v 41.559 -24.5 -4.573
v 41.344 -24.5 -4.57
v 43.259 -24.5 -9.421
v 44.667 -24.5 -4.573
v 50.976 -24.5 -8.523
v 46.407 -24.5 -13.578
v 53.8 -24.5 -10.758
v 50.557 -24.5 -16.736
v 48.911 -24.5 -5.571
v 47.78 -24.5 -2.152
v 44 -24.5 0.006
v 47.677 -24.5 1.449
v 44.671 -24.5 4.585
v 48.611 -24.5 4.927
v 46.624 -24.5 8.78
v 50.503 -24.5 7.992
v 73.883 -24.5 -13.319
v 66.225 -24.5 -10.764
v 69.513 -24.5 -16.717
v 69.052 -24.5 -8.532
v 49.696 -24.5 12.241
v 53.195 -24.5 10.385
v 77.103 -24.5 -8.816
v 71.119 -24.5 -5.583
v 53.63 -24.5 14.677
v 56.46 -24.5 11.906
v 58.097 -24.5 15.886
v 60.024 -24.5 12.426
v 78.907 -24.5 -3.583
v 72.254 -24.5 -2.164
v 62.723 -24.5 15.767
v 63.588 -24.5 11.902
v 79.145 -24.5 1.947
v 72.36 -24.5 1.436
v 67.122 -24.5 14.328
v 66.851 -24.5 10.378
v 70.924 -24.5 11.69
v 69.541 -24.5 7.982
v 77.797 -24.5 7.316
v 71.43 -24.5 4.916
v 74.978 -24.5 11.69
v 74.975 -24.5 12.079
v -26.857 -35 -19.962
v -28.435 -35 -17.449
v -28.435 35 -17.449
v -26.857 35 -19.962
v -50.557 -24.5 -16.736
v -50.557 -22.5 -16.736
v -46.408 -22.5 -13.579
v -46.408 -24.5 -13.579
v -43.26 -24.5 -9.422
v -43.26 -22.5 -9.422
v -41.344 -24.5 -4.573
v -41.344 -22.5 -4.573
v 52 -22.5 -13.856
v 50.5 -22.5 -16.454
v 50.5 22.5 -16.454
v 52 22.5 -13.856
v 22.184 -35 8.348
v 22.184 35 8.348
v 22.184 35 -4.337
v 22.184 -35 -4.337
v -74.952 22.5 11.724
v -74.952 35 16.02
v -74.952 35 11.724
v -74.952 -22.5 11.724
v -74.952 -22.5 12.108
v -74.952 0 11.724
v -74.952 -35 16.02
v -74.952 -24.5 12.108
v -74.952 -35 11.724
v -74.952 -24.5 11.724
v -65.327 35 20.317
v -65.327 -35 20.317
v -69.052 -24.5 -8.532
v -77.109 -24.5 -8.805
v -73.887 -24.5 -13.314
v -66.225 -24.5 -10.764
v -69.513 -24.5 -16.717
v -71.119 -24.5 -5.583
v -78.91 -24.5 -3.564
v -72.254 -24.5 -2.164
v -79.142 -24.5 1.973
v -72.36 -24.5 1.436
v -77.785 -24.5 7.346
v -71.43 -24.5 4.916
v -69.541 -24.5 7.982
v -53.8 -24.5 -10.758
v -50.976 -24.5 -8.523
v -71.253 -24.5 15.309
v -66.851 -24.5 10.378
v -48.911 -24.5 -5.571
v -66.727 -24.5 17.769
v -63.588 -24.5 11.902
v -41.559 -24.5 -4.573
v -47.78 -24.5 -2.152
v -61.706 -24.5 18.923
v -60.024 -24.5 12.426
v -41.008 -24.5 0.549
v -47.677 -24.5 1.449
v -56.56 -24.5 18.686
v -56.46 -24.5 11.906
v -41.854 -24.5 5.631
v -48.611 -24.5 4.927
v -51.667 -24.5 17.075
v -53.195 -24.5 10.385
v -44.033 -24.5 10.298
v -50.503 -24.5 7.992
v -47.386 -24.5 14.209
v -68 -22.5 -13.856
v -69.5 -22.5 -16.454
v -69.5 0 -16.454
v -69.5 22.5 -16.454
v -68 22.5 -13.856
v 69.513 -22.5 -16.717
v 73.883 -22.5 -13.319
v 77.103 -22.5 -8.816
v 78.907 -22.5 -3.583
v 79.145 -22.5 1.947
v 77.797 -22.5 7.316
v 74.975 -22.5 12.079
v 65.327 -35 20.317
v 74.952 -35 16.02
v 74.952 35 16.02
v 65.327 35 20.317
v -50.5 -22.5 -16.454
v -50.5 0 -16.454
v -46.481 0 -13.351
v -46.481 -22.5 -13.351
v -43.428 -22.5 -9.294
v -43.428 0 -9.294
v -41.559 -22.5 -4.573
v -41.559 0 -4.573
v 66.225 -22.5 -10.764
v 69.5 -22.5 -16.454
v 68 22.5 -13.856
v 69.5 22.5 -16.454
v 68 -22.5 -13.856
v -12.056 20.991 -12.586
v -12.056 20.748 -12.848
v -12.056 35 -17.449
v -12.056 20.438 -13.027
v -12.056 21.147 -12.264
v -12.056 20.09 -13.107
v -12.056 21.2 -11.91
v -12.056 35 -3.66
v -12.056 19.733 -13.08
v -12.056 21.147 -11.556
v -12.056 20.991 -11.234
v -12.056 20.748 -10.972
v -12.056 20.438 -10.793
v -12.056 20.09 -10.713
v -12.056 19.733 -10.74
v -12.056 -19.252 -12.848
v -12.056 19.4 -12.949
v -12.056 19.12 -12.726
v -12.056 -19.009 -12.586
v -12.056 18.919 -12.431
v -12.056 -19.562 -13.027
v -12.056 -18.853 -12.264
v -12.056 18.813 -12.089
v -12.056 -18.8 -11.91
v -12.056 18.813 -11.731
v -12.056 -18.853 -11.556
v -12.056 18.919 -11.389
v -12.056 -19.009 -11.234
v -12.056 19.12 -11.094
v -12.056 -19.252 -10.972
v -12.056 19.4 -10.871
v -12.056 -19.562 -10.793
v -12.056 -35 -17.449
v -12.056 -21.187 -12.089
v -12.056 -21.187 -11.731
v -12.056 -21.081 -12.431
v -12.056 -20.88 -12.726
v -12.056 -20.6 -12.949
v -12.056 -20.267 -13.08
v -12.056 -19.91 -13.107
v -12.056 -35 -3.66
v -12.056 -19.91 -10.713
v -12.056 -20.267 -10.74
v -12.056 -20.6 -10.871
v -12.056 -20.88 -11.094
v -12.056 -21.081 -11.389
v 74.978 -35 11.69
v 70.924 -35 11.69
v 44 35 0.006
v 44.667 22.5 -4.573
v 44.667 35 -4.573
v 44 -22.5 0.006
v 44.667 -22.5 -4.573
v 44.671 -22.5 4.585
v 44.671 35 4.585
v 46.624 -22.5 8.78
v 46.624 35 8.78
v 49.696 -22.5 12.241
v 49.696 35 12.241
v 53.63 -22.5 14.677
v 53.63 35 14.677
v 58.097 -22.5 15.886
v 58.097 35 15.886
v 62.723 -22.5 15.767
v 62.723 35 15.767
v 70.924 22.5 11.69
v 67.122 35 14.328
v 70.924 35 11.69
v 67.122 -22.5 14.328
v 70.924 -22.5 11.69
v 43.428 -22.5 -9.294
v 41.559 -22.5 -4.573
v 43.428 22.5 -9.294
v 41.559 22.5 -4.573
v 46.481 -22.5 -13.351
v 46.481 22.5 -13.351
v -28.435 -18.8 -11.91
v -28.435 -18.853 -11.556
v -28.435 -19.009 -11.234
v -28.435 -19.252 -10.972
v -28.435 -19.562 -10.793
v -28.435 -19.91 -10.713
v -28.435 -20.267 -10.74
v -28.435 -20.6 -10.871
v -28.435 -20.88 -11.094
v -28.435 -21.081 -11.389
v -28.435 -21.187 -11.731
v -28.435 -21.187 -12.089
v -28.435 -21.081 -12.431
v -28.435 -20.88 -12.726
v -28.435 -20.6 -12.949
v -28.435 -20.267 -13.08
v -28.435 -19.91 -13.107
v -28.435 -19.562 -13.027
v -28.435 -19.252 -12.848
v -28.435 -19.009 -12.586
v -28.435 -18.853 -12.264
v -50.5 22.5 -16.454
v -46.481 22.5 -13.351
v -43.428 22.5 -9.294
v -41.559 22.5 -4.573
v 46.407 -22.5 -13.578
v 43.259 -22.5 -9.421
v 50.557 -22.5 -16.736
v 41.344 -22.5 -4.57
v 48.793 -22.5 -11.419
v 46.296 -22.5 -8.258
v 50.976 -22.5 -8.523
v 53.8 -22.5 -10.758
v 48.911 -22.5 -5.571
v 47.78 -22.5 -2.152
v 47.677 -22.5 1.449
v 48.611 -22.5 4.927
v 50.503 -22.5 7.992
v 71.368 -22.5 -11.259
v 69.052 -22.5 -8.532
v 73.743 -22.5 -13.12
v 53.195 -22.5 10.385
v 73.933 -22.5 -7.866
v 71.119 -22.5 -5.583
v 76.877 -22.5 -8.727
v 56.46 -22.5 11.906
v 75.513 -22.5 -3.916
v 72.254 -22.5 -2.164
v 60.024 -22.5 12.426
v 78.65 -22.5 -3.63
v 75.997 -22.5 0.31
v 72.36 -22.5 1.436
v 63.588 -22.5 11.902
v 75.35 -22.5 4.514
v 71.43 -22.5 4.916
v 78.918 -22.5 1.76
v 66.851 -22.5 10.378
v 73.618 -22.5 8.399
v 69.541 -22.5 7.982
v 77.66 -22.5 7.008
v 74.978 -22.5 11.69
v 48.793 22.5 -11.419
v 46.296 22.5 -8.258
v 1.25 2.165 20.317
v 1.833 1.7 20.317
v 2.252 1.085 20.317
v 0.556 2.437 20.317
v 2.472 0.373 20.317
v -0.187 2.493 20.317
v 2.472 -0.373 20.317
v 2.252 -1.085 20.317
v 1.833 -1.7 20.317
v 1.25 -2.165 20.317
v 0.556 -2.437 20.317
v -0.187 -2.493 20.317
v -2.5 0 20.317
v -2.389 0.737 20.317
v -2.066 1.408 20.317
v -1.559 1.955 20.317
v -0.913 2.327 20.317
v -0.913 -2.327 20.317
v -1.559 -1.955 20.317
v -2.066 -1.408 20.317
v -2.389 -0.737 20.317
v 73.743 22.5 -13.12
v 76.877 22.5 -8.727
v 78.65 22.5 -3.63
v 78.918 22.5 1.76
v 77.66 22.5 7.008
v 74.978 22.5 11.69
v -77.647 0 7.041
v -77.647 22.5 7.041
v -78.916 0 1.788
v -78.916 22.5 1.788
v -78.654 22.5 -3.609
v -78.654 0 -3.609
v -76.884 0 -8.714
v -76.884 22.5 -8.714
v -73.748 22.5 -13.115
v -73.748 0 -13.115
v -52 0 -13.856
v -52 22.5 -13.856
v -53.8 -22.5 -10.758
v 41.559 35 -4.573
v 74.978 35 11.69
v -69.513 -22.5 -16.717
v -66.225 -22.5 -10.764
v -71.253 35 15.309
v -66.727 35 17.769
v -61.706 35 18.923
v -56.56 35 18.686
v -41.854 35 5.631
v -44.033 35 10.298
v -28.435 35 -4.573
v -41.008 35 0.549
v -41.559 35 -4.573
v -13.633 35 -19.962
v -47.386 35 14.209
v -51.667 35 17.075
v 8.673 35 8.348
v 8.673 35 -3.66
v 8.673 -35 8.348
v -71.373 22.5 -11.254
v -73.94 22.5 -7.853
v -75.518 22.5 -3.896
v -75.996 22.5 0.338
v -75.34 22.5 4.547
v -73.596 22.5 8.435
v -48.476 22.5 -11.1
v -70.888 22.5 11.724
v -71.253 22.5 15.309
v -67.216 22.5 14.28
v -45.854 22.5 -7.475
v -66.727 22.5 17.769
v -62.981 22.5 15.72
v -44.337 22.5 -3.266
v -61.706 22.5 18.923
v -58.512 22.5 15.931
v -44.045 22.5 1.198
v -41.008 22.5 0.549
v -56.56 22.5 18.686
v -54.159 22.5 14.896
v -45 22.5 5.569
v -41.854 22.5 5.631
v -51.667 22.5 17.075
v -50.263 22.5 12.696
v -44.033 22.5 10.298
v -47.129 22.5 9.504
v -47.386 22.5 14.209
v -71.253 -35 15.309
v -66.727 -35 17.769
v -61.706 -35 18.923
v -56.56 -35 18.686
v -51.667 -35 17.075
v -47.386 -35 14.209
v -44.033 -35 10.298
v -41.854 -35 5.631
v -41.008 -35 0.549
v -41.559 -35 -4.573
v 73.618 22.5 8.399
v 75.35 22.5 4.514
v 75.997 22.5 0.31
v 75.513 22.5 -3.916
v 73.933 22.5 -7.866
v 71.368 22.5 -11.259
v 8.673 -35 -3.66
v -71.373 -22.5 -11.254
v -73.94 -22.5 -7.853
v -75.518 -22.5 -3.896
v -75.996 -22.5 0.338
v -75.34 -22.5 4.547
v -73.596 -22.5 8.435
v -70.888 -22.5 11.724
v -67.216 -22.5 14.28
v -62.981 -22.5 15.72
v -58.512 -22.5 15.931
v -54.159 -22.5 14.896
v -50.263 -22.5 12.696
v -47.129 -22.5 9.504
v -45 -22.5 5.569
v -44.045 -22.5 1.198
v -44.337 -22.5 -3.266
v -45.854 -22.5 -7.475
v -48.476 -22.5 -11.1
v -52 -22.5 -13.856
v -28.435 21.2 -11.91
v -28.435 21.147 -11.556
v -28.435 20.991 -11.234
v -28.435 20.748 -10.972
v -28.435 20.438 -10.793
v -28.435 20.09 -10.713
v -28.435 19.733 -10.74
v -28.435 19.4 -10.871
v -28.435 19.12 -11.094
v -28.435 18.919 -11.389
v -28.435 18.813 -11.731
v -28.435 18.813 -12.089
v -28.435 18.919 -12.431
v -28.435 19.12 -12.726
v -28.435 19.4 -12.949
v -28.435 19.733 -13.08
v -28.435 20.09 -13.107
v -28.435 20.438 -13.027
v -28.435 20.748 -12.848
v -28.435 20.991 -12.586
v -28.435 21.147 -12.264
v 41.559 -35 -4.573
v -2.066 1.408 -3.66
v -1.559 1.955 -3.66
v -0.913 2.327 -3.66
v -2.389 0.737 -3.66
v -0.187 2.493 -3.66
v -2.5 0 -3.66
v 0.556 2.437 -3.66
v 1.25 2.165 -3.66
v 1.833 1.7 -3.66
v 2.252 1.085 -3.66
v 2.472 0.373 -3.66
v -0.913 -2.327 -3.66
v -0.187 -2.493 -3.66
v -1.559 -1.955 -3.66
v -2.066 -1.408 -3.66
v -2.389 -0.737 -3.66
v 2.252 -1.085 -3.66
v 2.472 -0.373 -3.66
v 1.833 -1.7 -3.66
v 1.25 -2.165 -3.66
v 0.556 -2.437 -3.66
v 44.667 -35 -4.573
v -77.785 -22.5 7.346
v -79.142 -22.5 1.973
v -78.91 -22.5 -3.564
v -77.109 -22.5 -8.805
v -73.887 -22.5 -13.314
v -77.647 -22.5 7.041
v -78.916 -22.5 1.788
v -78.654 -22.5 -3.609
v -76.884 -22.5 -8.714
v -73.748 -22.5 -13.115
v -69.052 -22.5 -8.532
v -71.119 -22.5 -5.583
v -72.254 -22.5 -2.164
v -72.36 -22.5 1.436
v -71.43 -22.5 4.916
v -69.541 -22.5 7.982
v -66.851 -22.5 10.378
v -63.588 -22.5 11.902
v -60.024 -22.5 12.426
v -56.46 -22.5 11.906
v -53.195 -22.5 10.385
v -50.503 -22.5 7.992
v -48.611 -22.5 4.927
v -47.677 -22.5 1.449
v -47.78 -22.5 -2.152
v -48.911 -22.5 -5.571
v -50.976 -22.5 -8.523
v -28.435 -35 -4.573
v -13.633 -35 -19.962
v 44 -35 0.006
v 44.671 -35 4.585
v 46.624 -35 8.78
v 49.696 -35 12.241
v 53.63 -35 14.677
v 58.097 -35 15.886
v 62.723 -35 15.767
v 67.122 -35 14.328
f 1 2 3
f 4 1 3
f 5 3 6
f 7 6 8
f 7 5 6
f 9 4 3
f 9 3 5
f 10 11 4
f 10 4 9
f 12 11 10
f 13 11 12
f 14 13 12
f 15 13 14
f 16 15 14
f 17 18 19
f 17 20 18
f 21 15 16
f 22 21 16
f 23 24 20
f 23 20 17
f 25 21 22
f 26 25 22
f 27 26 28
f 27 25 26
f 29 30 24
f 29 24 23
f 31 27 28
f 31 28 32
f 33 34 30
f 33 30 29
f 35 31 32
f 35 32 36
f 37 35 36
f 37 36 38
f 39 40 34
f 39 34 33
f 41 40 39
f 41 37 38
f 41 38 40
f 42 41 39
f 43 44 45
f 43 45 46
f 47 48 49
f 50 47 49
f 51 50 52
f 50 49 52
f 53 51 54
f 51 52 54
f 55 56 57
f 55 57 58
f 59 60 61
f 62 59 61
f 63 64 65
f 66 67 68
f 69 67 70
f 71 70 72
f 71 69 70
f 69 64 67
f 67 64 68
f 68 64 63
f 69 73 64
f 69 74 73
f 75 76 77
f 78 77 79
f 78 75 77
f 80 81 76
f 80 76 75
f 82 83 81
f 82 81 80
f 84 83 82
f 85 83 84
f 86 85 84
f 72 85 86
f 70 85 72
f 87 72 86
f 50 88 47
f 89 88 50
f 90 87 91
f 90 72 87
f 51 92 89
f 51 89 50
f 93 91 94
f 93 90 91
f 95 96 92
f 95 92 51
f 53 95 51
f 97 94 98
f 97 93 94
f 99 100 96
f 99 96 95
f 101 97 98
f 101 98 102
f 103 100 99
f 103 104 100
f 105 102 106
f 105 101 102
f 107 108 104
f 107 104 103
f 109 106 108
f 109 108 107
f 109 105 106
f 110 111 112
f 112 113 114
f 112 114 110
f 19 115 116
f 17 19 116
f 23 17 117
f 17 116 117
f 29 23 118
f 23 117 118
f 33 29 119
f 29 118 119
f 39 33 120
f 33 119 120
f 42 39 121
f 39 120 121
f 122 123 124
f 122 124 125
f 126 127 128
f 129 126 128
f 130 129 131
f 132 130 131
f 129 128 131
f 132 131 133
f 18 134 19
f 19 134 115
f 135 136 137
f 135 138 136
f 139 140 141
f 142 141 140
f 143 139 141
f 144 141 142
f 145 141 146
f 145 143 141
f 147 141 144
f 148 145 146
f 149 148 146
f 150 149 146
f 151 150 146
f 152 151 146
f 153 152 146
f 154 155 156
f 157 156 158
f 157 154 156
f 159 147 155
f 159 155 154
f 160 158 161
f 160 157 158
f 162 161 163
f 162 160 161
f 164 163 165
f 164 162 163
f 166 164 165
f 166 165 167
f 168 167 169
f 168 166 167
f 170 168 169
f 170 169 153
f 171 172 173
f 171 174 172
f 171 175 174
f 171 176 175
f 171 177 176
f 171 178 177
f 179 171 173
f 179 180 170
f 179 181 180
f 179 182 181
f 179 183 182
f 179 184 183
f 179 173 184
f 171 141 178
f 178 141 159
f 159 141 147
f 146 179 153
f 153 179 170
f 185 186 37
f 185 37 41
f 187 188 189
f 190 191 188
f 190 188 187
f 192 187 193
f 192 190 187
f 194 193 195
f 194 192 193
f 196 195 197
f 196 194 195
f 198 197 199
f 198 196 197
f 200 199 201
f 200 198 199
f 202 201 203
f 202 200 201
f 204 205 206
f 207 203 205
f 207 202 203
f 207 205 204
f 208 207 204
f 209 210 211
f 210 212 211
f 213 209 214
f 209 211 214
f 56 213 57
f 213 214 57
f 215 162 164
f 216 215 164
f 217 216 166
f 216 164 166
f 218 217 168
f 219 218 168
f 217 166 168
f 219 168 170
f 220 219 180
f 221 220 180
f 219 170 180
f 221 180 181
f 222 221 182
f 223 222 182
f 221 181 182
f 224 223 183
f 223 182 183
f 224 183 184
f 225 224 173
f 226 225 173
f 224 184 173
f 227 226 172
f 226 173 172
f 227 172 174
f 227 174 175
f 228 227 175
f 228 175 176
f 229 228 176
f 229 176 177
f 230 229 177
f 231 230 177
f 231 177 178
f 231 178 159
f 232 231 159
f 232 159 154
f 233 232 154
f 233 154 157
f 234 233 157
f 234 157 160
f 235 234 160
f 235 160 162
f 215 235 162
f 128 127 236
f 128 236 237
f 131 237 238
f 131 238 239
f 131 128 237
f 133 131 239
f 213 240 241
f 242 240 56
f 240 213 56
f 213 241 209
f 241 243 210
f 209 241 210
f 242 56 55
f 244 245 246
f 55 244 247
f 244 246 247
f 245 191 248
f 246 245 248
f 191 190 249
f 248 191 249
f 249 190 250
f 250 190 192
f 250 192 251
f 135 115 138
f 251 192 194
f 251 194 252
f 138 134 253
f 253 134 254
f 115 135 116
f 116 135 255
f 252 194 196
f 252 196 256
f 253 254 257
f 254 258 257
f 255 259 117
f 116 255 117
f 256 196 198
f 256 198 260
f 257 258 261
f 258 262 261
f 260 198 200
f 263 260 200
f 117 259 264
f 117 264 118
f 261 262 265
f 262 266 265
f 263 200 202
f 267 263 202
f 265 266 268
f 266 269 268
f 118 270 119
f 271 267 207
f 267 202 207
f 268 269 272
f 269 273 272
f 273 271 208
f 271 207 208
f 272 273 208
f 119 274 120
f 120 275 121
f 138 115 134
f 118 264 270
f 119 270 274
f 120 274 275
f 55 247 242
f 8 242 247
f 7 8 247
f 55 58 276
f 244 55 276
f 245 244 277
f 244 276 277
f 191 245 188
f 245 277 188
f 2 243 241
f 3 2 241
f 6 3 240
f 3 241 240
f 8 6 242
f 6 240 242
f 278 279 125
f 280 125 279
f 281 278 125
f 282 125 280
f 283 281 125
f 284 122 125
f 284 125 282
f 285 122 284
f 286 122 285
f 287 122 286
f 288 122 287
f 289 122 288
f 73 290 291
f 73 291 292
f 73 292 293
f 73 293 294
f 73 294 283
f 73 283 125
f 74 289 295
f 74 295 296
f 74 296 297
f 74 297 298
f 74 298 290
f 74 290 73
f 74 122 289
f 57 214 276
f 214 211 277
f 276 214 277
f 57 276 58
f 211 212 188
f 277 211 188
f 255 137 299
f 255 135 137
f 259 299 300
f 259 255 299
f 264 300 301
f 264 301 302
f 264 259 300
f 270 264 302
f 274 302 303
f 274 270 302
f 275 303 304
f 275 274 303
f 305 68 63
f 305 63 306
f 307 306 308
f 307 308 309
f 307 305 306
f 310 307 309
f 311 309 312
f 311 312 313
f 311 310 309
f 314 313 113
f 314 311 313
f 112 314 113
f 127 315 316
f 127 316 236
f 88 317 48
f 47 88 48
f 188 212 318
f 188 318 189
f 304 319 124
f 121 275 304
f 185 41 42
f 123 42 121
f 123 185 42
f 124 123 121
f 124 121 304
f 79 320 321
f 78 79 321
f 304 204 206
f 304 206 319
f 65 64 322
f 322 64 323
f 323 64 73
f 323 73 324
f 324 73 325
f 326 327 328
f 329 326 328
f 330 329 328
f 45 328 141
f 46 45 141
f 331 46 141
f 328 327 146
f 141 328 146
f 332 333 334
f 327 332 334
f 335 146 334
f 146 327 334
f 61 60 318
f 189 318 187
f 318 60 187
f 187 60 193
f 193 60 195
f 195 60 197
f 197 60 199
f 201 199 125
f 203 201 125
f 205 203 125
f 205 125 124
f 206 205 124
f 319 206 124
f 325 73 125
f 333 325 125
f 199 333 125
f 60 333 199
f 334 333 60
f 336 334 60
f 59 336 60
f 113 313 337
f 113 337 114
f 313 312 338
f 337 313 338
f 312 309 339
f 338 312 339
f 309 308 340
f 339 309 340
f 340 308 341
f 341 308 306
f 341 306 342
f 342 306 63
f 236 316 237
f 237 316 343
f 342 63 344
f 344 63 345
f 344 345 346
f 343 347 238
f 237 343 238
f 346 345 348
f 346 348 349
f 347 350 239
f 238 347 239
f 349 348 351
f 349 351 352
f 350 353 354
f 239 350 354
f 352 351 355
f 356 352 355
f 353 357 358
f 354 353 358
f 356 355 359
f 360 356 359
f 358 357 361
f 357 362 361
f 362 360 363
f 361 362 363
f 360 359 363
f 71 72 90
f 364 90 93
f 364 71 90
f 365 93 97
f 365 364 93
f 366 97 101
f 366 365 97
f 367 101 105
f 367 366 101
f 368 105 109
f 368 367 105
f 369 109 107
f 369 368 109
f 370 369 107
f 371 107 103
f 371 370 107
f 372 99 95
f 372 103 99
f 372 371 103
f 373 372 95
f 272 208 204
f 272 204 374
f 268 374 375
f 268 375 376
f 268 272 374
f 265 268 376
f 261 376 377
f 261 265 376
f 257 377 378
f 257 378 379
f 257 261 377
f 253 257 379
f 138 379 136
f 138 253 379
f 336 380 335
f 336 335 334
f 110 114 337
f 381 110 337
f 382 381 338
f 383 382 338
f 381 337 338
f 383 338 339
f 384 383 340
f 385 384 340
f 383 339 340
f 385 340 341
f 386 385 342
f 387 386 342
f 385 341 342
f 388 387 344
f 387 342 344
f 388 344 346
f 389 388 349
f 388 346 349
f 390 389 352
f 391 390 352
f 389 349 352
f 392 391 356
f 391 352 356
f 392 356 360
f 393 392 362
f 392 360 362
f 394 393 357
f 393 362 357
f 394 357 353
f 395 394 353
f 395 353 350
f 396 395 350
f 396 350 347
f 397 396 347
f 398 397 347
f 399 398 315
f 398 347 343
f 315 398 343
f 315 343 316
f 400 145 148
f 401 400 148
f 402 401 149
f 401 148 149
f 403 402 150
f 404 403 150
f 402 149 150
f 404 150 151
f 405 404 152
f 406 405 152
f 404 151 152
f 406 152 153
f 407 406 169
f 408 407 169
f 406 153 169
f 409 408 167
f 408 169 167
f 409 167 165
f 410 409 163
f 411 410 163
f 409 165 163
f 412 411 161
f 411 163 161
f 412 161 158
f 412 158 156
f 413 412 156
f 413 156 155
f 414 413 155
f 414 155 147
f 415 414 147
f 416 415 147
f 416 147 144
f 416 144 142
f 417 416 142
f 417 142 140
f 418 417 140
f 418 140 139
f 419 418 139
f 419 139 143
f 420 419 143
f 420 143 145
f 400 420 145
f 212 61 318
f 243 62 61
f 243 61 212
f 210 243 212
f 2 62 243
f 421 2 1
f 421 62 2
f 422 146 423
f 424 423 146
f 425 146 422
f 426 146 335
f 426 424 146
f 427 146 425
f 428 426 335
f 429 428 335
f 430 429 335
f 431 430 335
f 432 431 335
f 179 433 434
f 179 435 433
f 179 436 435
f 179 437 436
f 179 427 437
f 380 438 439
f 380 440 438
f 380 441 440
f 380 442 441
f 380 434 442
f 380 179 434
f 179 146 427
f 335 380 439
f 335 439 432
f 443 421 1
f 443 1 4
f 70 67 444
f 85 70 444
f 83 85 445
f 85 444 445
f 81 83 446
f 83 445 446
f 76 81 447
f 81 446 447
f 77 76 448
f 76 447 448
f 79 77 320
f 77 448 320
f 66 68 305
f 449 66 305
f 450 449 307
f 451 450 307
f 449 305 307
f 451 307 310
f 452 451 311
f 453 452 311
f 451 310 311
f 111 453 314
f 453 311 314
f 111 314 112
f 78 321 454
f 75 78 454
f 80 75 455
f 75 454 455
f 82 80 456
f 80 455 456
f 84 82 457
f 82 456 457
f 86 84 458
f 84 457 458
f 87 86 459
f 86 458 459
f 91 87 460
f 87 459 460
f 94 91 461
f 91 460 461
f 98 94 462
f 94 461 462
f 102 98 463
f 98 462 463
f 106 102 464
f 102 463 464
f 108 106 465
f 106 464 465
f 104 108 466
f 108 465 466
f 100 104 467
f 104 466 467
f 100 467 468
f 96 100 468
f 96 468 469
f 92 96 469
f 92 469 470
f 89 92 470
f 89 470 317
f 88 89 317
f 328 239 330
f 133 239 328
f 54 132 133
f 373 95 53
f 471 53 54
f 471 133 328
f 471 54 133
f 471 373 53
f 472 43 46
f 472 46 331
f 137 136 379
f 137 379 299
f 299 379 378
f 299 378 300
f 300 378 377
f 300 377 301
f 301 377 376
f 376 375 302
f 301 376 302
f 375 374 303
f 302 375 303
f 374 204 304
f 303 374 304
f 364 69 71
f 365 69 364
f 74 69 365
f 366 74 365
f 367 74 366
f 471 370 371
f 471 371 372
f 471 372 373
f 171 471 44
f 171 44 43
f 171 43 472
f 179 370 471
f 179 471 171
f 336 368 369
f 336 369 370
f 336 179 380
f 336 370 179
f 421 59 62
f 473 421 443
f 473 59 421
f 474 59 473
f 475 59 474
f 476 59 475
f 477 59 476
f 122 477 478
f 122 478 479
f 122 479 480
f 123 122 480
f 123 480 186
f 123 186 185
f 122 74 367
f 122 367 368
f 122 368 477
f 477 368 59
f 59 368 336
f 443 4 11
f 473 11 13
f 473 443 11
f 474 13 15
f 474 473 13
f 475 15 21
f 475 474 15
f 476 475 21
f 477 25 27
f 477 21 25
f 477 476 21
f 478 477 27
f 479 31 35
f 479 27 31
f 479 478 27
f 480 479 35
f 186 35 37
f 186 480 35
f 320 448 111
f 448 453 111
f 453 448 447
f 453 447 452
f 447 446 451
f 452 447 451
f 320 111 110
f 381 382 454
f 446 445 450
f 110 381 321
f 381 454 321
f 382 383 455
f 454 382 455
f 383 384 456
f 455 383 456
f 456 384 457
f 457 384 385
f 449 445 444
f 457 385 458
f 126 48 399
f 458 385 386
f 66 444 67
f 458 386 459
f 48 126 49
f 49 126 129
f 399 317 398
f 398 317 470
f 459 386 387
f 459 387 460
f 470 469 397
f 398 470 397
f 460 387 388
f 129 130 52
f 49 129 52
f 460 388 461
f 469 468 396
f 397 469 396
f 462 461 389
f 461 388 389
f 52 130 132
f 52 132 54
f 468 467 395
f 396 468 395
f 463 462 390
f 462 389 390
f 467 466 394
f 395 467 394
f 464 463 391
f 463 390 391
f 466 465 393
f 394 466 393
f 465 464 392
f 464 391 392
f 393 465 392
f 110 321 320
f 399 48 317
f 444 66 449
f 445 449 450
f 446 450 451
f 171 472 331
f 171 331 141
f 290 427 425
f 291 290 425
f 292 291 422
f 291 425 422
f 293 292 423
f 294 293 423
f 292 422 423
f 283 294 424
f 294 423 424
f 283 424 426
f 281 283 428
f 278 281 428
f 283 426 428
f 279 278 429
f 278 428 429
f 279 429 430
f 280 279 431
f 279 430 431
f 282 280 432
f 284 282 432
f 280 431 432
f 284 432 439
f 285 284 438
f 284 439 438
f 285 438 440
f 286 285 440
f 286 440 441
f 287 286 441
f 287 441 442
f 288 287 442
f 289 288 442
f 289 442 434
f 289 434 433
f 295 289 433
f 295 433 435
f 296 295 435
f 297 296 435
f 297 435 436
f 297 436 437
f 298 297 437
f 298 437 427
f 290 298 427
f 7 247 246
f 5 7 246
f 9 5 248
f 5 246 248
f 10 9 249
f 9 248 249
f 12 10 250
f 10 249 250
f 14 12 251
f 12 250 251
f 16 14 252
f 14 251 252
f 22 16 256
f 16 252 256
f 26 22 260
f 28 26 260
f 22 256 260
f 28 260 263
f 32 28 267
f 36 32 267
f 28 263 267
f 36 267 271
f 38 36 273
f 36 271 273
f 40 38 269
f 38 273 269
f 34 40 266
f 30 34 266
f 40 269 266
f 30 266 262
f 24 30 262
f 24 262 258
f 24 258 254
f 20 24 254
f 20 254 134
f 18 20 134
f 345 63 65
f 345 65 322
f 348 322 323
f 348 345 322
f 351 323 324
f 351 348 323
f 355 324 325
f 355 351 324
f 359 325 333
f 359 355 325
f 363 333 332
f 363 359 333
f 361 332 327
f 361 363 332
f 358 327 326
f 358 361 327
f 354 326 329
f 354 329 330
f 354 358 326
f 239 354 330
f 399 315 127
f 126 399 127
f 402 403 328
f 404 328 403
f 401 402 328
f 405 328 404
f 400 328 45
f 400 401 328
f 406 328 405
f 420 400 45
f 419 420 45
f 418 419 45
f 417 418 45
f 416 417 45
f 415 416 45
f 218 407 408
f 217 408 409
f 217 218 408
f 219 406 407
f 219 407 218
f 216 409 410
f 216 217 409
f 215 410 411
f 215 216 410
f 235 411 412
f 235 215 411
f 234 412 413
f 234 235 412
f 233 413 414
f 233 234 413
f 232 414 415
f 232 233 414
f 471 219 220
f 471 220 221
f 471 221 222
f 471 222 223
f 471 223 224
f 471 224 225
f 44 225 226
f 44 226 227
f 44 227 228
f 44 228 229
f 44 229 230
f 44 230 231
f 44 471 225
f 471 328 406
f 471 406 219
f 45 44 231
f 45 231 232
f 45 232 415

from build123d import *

# Parameters (mm, degrees)
F1_DEPTH = 35
F2_DEPTH = 22.5
F5_DEPTH = 2
F7_D     = 2.4
F7_DEPTH = 18
F7_TIP   = 0.7210327428
F10_D    = 5


with BuildPart() as f1:
    # F0 (on Front) → F1 (new body, symmetric)
    with BuildSketch(Plane.XZ):
        with BuildLine():
            ThreePointArc((-74.9516211859, 11.7238655704), (-51.6668855763, 17.075104802), (-41.558504512, -4.5728813857))
            Line((-41.558504512, -4.5728813857), (-28.4346174449, -4.5728813857))
            Line((-28.4346174449, -4.5728813857), (-28.4346174449, -17.4488071352))
            Line((-28.4346174449, -17.4488071352), (-26.8566174449, -19.9622381479))
            Line((-26.8566174449, -19.9622381479), (-13.633294031, -19.9622381479))
            Line((-13.633294031, -19.9622381479), (-12.0557677819, -17.4488071352))
            Line((-12.0557677819, -17.4488071352), (-12.0557677819, -3.6602381479))
            Line((-12.0557677819, -3.6602381479), (8.6728588212, -3.6602381479))
            Line((8.6728588212, -3.6602381479), (8.6728588212, 8.3482577465))
            Line((8.6728588212, 8.3482577465), (22.1839677542, 8.3482577465))
            Line((22.1839677542, 8.3482577465), (22.1839677542, -4.337257977))
            Line((22.1839677542, -4.337257977), (41.558504512, -4.5728813857))
            Line((41.558504512, -4.5728813857), (44.6673956605, -4.5728813857))
            ThreePointArc((44.6673956605, -4.5728813857), (51.5748749774, 13.6021052912), (70.9240066517, 11.6904267961))
            Line((70.9240066517, 11.6904267961), (74.9777809213, 11.6904267961))
            Line((74.9777809213, 11.6904267961), (74.9516211859, 16.0203691918))
            Line((74.9516211859, 16.0203691918), (65.3270802818, 20.3168728132))
            Line((65.3270802818, 20.3168728132), (-65.3270802818, 20.3168728132))
            Line((-65.3270802818, 20.3168728132), (-74.9516211859, 16.0203691918))
            Line((-74.9516211859, 16.0203691918), (-74.9516211859, 11.7238655704))
        make_face()
    extrude(amount=F1_DEPTH, both=True)

    # F0 (on Front) → F2 (join, symmetric)
    with BuildSketch(Plane.XZ):
        with BuildLine():
            ThreePointArc((-68, -13.8564064606), (-75.8989864476, -1.7950570853), (-70.888111686, 11.7238655704))
            Line((-70.888111686, 11.7238655704), (-74.9516211859, 11.7238655704))
            ThreePointArc((-74.9516211859, 11.7238655704), (-78.6540953163, -3.6089787931), (-69.5, -16.4544826719))
            Line((-69.5, -16.4544826719), (-68, -13.8564064606))
        make_face()
        with BuildLine():
            ThreePointArc((-44.6673956605, -4.5728813857), (-47.4441819952, -9.9172291609), (-52, -13.8564064606))
            Line((-52, -13.8564064606), (-50.5, -16.4544826719))
            ThreePointArc((-50.5, -16.4544826719), (-44.818600038, -11.4247579927), (-41.558504512, -4.5728813857))
            Line((-41.558504512, -4.5728813857), (-44.6673956605, -4.5728813857))
        make_face()
        with BuildLine():
            ThreePointArc((-70.888111686, 11.7238655704), (-51.5540323778, 13.5891732981), (-44.6673956605, -4.5728813857))
            Line((-44.6673956605, -4.5728813857), (-41.558504512, -4.5728813857))
            ThreePointArc((-41.558504512, -4.5728813857), (-51.6668855763, 17.075104802), (-74.9516211859, 11.7238655704))
            Line((-74.9516211859, 11.7238655704), (-70.888111686, 11.7238655704))
        make_face()
        with BuildLine():
            ThreePointArc((52, -13.8564064606), (47.4441819952, -9.9172291609), (44.6673956605, -4.5728813857))
            Line((44.6673956605, -4.5728813857), (41.558504512, -4.5728813857))
            ThreePointArc((41.558504512, -4.5728813857), (44.818600038, -11.4247579927), (50.5, -16.4544826719))
            Line((50.5, -16.4544826719), (52, -13.8564064606))
        make_face()
        with BuildLine():
            ThreePointArc((69.5, -16.4544826719), (78.6500515267, -3.629817909), (74.9777809213, 11.6904267961))
            Line((74.9777809213, 11.6904267961), (70.9240066517, 11.6904267961))
            ThreePointArc((70.9240066517, 11.6904267961), (75.8962158798, -1.8194286745), (68, -13.8564064606))
            Line((68, -13.8564064606), (69.5, -16.4544826719))
        make_face()
    extrude(amount=F2_DEPTH, both=True)

    # F4 (on offset) → F5 (join)
    with BuildSketch(Plane.XZ.offset(22.5)):
        with BuildLine():
            ThreePointArc((-66.2250077663, -10.764406164), (-60.0242756476, 12.4257611455), (-53.8000638867, -10.7581152906))
            Line((-53.8000638867, -10.7581152906), (-50.5566579219, -16.7363728506))
            ThreePointArc((-50.5566579219, -16.7363728506), (-59.9985634557, 19.2255688342), (-69.5131042914, -16.7172238027))
            Line((-69.5131042914, -16.7172238027), (-66.2250077663, -10.764406164))
        make_face()
        with BuildLine():
            ThreePointArc((69.5131042914, -16.7172238027), (59.9985634557, 19.2255688342), (50.5566579219, -16.7363728506))
            Line((50.5566579219, -16.7363728506), (53.8000638867, -10.7581152906))
            ThreePointArc((53.8000638867, -10.7581152906), (60.0242756476, 12.4257611455), (66.2250077663, -10.764406164))
            Line((66.2250077663, -10.764406164), (69.5131042914, -16.7172238027))
        make_face()
    extrude(amount=F5_DEPTH)

    # F7 (one way)
    with BuildSketch(Plane.YZ.offset(-12.0557677819)):
        with Locations((-20, -11.9100315496), (20, -11.9100315496)):
            Circle(F7_D / 2)
    extrude(amount=-F7_DEPTH, mode=Mode.SUBTRACT)
    with Locations(Plane.YZ.offset(-12.0557677819)):
        with Locations((-20, -11.9100315496), (20, -11.9100315496)):
            with Locations((0, 0, -(F7_DEPTH + F7_TIP / 2))):  # 118° drill point
                Cone(0, F7_D / 2, F7_TIP, mode=Mode.SUBTRACT)

    # F10 (through all)
    with Locations(Plane.XY.offset(20.3168728132)):
        with Locations((0, 0)):
            Hole(F10_D / 2)


solid = f1.part
